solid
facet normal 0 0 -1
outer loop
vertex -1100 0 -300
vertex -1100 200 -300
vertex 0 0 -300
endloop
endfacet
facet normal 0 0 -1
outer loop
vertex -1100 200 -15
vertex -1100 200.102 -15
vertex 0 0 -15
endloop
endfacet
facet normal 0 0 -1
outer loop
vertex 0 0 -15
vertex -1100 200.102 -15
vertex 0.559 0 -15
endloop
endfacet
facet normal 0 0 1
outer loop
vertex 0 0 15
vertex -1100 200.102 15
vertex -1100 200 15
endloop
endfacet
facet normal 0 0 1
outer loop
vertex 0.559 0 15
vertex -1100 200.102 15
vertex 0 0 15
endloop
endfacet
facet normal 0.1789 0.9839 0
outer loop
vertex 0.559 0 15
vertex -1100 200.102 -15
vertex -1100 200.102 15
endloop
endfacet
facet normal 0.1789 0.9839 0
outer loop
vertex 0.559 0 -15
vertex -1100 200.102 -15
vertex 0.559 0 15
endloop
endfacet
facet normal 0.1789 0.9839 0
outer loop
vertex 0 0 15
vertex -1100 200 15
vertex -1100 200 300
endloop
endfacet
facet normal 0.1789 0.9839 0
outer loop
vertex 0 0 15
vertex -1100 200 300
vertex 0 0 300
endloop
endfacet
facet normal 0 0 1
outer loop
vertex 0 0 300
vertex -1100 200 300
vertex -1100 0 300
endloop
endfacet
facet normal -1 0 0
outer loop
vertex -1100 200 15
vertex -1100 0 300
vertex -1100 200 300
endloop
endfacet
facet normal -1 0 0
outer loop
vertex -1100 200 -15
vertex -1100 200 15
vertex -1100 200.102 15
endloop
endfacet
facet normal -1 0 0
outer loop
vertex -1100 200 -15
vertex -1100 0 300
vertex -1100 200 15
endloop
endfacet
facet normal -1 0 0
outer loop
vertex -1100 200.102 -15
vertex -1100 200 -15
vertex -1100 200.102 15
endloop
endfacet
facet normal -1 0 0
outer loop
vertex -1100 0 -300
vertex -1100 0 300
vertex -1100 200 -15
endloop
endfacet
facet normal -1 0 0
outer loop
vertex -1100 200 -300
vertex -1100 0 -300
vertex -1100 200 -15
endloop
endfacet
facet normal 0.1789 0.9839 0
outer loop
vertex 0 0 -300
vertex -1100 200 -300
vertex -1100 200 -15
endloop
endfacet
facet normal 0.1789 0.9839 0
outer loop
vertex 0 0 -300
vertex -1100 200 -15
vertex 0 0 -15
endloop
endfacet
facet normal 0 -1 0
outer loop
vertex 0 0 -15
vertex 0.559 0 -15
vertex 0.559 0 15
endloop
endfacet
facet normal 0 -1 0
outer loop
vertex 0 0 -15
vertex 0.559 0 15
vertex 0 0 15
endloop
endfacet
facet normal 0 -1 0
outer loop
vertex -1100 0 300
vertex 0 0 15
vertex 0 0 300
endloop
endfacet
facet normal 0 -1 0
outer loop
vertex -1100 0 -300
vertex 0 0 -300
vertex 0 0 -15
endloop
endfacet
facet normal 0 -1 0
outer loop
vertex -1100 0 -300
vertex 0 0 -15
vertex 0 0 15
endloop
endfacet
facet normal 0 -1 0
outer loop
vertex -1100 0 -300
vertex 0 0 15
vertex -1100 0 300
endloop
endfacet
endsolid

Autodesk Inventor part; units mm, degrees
ref_plane "YZ Plane" through (0, 0, 0) normal (1, 0, 0) x (0, 1, 0)
ref_plane "XZ Plane" through (0, 0, 0) normal (0, 1, 0) x (-1, 0, 0)
ref_plane "XY Plane" through (0, 0, 0) normal (0, 0, 1) x (1, 0, 0)
sketch "スケッチ1" plane through (0, 0, 0) normal (0, 0, 1) x (1, 0, 0)
  line L0 (0, 0) -> (-1100, 0)
  line L1 (-1100, 0) -> (-1100, 200)
  line L2 (-1100, 200) -> (0, 0)
  dimension "d1" = 1100
  dimension "d2" = 200
extrude "押し出し1" add sketch "スケッチ1" along normal mid plane 600
sketch "スケッチ2" plane through (0, 0, 0) normal (0, 0, 1) x (1, 0, 0)
  line L0 (-1100, 0) -> (0, 0) projected
  line L1 (0, 0) -> (-1100, 200) projected
  line L2 (-1100, 200) -> (-1100, 0) projected
  line L3 (-1100, 200) -> (-1100, 200.1016)
  line L4 (-1100, 200.1016) -> (0.559, 0)
  line L5 (0.559, 0) -> (0, 0)
  dimension "d5" = 0.1
extrude "押し出し2" add sketch "スケッチ2" along normal mid plane 30 contours L1 L3 L4 L5
properties part number "Slope 1"
